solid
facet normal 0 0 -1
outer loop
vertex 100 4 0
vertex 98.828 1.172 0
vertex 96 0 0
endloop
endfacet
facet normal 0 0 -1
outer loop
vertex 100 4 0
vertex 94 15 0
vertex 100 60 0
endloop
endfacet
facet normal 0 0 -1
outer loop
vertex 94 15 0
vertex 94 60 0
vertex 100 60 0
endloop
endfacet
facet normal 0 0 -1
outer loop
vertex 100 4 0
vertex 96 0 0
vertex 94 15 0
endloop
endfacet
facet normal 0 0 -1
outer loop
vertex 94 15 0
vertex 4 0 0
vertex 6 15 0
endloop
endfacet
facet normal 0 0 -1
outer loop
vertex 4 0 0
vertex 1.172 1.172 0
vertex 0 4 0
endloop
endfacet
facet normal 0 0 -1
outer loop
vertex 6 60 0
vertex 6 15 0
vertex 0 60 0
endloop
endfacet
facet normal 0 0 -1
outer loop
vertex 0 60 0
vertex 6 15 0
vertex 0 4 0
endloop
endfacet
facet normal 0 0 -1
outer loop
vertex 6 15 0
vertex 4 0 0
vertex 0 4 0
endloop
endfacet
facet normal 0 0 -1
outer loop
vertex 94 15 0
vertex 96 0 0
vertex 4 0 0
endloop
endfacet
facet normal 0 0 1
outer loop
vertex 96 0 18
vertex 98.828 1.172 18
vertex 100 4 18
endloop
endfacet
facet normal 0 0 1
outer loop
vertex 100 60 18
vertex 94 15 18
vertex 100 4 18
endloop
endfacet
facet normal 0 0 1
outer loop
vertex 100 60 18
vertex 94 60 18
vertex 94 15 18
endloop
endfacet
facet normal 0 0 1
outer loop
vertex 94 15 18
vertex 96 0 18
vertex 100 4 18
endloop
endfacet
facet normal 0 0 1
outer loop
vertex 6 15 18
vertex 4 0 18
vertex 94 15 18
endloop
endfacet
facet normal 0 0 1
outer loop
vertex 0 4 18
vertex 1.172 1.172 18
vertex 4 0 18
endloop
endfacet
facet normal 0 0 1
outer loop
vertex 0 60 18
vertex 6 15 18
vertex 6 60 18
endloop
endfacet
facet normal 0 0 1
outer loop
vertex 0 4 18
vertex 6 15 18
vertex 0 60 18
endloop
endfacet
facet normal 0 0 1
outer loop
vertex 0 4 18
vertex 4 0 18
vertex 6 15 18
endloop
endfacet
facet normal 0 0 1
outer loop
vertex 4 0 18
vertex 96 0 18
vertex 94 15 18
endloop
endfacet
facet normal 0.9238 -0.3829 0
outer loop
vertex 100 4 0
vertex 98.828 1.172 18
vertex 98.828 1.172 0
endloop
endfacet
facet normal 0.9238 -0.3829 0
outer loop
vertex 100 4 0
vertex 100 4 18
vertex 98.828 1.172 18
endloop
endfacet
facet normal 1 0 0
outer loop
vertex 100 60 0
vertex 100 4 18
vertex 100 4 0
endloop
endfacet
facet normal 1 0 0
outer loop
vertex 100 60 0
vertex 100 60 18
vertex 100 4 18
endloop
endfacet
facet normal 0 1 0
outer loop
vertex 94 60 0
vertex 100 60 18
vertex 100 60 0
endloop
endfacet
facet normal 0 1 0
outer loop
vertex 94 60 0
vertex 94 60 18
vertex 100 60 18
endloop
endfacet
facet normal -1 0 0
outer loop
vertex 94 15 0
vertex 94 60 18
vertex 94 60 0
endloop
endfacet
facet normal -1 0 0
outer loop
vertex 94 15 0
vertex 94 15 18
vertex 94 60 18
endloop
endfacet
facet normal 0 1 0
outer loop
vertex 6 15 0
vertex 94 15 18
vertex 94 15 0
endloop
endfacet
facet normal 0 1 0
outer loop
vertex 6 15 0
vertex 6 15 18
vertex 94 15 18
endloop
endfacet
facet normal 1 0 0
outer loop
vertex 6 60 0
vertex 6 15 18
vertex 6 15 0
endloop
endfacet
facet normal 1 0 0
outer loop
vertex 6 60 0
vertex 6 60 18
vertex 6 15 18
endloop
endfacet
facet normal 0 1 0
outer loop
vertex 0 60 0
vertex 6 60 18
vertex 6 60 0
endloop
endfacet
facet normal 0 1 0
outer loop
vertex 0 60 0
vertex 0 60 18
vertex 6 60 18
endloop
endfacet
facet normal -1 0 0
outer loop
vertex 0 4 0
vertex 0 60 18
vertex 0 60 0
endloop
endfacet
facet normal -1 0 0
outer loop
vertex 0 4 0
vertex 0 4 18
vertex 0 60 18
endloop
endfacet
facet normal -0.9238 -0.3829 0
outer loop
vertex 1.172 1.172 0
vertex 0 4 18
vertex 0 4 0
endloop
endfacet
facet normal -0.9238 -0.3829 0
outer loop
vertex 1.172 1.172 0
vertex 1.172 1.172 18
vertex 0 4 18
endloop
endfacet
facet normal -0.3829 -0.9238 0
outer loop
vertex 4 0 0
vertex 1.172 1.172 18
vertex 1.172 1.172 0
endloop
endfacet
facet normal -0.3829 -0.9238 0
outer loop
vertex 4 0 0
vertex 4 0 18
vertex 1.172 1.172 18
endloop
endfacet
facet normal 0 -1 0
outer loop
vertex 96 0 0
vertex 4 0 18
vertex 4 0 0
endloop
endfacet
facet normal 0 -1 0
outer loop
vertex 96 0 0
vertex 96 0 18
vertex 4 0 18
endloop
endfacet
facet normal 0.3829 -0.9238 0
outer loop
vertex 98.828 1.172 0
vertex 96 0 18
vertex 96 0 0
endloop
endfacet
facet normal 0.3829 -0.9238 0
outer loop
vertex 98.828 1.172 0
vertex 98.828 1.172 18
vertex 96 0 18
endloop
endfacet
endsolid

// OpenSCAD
$fn = 32;

// ----------------------------------------------------------------------
// Heat sink frame: 100 x 60 mm frame, 6 mm walls
// ----------------------------------------------------------------------

// --- parameters (mm) ---
profile_height = 18;      // extrusion height
profile_points = 12;      // points of the closed outline

profile = [[0, 4], [1.172, 1.172], [4, 0], [96, 0], [98.828, 1.172], [100, 4], [100, 60], [94, 60], [94, 15], [6, 15], [6, 60], [0, 60]];  // single closed polygon, 12 points, counter clockwise

// --- the one profile operation ---
linear_extrude(height = profile_height) polygon(points = profile);
